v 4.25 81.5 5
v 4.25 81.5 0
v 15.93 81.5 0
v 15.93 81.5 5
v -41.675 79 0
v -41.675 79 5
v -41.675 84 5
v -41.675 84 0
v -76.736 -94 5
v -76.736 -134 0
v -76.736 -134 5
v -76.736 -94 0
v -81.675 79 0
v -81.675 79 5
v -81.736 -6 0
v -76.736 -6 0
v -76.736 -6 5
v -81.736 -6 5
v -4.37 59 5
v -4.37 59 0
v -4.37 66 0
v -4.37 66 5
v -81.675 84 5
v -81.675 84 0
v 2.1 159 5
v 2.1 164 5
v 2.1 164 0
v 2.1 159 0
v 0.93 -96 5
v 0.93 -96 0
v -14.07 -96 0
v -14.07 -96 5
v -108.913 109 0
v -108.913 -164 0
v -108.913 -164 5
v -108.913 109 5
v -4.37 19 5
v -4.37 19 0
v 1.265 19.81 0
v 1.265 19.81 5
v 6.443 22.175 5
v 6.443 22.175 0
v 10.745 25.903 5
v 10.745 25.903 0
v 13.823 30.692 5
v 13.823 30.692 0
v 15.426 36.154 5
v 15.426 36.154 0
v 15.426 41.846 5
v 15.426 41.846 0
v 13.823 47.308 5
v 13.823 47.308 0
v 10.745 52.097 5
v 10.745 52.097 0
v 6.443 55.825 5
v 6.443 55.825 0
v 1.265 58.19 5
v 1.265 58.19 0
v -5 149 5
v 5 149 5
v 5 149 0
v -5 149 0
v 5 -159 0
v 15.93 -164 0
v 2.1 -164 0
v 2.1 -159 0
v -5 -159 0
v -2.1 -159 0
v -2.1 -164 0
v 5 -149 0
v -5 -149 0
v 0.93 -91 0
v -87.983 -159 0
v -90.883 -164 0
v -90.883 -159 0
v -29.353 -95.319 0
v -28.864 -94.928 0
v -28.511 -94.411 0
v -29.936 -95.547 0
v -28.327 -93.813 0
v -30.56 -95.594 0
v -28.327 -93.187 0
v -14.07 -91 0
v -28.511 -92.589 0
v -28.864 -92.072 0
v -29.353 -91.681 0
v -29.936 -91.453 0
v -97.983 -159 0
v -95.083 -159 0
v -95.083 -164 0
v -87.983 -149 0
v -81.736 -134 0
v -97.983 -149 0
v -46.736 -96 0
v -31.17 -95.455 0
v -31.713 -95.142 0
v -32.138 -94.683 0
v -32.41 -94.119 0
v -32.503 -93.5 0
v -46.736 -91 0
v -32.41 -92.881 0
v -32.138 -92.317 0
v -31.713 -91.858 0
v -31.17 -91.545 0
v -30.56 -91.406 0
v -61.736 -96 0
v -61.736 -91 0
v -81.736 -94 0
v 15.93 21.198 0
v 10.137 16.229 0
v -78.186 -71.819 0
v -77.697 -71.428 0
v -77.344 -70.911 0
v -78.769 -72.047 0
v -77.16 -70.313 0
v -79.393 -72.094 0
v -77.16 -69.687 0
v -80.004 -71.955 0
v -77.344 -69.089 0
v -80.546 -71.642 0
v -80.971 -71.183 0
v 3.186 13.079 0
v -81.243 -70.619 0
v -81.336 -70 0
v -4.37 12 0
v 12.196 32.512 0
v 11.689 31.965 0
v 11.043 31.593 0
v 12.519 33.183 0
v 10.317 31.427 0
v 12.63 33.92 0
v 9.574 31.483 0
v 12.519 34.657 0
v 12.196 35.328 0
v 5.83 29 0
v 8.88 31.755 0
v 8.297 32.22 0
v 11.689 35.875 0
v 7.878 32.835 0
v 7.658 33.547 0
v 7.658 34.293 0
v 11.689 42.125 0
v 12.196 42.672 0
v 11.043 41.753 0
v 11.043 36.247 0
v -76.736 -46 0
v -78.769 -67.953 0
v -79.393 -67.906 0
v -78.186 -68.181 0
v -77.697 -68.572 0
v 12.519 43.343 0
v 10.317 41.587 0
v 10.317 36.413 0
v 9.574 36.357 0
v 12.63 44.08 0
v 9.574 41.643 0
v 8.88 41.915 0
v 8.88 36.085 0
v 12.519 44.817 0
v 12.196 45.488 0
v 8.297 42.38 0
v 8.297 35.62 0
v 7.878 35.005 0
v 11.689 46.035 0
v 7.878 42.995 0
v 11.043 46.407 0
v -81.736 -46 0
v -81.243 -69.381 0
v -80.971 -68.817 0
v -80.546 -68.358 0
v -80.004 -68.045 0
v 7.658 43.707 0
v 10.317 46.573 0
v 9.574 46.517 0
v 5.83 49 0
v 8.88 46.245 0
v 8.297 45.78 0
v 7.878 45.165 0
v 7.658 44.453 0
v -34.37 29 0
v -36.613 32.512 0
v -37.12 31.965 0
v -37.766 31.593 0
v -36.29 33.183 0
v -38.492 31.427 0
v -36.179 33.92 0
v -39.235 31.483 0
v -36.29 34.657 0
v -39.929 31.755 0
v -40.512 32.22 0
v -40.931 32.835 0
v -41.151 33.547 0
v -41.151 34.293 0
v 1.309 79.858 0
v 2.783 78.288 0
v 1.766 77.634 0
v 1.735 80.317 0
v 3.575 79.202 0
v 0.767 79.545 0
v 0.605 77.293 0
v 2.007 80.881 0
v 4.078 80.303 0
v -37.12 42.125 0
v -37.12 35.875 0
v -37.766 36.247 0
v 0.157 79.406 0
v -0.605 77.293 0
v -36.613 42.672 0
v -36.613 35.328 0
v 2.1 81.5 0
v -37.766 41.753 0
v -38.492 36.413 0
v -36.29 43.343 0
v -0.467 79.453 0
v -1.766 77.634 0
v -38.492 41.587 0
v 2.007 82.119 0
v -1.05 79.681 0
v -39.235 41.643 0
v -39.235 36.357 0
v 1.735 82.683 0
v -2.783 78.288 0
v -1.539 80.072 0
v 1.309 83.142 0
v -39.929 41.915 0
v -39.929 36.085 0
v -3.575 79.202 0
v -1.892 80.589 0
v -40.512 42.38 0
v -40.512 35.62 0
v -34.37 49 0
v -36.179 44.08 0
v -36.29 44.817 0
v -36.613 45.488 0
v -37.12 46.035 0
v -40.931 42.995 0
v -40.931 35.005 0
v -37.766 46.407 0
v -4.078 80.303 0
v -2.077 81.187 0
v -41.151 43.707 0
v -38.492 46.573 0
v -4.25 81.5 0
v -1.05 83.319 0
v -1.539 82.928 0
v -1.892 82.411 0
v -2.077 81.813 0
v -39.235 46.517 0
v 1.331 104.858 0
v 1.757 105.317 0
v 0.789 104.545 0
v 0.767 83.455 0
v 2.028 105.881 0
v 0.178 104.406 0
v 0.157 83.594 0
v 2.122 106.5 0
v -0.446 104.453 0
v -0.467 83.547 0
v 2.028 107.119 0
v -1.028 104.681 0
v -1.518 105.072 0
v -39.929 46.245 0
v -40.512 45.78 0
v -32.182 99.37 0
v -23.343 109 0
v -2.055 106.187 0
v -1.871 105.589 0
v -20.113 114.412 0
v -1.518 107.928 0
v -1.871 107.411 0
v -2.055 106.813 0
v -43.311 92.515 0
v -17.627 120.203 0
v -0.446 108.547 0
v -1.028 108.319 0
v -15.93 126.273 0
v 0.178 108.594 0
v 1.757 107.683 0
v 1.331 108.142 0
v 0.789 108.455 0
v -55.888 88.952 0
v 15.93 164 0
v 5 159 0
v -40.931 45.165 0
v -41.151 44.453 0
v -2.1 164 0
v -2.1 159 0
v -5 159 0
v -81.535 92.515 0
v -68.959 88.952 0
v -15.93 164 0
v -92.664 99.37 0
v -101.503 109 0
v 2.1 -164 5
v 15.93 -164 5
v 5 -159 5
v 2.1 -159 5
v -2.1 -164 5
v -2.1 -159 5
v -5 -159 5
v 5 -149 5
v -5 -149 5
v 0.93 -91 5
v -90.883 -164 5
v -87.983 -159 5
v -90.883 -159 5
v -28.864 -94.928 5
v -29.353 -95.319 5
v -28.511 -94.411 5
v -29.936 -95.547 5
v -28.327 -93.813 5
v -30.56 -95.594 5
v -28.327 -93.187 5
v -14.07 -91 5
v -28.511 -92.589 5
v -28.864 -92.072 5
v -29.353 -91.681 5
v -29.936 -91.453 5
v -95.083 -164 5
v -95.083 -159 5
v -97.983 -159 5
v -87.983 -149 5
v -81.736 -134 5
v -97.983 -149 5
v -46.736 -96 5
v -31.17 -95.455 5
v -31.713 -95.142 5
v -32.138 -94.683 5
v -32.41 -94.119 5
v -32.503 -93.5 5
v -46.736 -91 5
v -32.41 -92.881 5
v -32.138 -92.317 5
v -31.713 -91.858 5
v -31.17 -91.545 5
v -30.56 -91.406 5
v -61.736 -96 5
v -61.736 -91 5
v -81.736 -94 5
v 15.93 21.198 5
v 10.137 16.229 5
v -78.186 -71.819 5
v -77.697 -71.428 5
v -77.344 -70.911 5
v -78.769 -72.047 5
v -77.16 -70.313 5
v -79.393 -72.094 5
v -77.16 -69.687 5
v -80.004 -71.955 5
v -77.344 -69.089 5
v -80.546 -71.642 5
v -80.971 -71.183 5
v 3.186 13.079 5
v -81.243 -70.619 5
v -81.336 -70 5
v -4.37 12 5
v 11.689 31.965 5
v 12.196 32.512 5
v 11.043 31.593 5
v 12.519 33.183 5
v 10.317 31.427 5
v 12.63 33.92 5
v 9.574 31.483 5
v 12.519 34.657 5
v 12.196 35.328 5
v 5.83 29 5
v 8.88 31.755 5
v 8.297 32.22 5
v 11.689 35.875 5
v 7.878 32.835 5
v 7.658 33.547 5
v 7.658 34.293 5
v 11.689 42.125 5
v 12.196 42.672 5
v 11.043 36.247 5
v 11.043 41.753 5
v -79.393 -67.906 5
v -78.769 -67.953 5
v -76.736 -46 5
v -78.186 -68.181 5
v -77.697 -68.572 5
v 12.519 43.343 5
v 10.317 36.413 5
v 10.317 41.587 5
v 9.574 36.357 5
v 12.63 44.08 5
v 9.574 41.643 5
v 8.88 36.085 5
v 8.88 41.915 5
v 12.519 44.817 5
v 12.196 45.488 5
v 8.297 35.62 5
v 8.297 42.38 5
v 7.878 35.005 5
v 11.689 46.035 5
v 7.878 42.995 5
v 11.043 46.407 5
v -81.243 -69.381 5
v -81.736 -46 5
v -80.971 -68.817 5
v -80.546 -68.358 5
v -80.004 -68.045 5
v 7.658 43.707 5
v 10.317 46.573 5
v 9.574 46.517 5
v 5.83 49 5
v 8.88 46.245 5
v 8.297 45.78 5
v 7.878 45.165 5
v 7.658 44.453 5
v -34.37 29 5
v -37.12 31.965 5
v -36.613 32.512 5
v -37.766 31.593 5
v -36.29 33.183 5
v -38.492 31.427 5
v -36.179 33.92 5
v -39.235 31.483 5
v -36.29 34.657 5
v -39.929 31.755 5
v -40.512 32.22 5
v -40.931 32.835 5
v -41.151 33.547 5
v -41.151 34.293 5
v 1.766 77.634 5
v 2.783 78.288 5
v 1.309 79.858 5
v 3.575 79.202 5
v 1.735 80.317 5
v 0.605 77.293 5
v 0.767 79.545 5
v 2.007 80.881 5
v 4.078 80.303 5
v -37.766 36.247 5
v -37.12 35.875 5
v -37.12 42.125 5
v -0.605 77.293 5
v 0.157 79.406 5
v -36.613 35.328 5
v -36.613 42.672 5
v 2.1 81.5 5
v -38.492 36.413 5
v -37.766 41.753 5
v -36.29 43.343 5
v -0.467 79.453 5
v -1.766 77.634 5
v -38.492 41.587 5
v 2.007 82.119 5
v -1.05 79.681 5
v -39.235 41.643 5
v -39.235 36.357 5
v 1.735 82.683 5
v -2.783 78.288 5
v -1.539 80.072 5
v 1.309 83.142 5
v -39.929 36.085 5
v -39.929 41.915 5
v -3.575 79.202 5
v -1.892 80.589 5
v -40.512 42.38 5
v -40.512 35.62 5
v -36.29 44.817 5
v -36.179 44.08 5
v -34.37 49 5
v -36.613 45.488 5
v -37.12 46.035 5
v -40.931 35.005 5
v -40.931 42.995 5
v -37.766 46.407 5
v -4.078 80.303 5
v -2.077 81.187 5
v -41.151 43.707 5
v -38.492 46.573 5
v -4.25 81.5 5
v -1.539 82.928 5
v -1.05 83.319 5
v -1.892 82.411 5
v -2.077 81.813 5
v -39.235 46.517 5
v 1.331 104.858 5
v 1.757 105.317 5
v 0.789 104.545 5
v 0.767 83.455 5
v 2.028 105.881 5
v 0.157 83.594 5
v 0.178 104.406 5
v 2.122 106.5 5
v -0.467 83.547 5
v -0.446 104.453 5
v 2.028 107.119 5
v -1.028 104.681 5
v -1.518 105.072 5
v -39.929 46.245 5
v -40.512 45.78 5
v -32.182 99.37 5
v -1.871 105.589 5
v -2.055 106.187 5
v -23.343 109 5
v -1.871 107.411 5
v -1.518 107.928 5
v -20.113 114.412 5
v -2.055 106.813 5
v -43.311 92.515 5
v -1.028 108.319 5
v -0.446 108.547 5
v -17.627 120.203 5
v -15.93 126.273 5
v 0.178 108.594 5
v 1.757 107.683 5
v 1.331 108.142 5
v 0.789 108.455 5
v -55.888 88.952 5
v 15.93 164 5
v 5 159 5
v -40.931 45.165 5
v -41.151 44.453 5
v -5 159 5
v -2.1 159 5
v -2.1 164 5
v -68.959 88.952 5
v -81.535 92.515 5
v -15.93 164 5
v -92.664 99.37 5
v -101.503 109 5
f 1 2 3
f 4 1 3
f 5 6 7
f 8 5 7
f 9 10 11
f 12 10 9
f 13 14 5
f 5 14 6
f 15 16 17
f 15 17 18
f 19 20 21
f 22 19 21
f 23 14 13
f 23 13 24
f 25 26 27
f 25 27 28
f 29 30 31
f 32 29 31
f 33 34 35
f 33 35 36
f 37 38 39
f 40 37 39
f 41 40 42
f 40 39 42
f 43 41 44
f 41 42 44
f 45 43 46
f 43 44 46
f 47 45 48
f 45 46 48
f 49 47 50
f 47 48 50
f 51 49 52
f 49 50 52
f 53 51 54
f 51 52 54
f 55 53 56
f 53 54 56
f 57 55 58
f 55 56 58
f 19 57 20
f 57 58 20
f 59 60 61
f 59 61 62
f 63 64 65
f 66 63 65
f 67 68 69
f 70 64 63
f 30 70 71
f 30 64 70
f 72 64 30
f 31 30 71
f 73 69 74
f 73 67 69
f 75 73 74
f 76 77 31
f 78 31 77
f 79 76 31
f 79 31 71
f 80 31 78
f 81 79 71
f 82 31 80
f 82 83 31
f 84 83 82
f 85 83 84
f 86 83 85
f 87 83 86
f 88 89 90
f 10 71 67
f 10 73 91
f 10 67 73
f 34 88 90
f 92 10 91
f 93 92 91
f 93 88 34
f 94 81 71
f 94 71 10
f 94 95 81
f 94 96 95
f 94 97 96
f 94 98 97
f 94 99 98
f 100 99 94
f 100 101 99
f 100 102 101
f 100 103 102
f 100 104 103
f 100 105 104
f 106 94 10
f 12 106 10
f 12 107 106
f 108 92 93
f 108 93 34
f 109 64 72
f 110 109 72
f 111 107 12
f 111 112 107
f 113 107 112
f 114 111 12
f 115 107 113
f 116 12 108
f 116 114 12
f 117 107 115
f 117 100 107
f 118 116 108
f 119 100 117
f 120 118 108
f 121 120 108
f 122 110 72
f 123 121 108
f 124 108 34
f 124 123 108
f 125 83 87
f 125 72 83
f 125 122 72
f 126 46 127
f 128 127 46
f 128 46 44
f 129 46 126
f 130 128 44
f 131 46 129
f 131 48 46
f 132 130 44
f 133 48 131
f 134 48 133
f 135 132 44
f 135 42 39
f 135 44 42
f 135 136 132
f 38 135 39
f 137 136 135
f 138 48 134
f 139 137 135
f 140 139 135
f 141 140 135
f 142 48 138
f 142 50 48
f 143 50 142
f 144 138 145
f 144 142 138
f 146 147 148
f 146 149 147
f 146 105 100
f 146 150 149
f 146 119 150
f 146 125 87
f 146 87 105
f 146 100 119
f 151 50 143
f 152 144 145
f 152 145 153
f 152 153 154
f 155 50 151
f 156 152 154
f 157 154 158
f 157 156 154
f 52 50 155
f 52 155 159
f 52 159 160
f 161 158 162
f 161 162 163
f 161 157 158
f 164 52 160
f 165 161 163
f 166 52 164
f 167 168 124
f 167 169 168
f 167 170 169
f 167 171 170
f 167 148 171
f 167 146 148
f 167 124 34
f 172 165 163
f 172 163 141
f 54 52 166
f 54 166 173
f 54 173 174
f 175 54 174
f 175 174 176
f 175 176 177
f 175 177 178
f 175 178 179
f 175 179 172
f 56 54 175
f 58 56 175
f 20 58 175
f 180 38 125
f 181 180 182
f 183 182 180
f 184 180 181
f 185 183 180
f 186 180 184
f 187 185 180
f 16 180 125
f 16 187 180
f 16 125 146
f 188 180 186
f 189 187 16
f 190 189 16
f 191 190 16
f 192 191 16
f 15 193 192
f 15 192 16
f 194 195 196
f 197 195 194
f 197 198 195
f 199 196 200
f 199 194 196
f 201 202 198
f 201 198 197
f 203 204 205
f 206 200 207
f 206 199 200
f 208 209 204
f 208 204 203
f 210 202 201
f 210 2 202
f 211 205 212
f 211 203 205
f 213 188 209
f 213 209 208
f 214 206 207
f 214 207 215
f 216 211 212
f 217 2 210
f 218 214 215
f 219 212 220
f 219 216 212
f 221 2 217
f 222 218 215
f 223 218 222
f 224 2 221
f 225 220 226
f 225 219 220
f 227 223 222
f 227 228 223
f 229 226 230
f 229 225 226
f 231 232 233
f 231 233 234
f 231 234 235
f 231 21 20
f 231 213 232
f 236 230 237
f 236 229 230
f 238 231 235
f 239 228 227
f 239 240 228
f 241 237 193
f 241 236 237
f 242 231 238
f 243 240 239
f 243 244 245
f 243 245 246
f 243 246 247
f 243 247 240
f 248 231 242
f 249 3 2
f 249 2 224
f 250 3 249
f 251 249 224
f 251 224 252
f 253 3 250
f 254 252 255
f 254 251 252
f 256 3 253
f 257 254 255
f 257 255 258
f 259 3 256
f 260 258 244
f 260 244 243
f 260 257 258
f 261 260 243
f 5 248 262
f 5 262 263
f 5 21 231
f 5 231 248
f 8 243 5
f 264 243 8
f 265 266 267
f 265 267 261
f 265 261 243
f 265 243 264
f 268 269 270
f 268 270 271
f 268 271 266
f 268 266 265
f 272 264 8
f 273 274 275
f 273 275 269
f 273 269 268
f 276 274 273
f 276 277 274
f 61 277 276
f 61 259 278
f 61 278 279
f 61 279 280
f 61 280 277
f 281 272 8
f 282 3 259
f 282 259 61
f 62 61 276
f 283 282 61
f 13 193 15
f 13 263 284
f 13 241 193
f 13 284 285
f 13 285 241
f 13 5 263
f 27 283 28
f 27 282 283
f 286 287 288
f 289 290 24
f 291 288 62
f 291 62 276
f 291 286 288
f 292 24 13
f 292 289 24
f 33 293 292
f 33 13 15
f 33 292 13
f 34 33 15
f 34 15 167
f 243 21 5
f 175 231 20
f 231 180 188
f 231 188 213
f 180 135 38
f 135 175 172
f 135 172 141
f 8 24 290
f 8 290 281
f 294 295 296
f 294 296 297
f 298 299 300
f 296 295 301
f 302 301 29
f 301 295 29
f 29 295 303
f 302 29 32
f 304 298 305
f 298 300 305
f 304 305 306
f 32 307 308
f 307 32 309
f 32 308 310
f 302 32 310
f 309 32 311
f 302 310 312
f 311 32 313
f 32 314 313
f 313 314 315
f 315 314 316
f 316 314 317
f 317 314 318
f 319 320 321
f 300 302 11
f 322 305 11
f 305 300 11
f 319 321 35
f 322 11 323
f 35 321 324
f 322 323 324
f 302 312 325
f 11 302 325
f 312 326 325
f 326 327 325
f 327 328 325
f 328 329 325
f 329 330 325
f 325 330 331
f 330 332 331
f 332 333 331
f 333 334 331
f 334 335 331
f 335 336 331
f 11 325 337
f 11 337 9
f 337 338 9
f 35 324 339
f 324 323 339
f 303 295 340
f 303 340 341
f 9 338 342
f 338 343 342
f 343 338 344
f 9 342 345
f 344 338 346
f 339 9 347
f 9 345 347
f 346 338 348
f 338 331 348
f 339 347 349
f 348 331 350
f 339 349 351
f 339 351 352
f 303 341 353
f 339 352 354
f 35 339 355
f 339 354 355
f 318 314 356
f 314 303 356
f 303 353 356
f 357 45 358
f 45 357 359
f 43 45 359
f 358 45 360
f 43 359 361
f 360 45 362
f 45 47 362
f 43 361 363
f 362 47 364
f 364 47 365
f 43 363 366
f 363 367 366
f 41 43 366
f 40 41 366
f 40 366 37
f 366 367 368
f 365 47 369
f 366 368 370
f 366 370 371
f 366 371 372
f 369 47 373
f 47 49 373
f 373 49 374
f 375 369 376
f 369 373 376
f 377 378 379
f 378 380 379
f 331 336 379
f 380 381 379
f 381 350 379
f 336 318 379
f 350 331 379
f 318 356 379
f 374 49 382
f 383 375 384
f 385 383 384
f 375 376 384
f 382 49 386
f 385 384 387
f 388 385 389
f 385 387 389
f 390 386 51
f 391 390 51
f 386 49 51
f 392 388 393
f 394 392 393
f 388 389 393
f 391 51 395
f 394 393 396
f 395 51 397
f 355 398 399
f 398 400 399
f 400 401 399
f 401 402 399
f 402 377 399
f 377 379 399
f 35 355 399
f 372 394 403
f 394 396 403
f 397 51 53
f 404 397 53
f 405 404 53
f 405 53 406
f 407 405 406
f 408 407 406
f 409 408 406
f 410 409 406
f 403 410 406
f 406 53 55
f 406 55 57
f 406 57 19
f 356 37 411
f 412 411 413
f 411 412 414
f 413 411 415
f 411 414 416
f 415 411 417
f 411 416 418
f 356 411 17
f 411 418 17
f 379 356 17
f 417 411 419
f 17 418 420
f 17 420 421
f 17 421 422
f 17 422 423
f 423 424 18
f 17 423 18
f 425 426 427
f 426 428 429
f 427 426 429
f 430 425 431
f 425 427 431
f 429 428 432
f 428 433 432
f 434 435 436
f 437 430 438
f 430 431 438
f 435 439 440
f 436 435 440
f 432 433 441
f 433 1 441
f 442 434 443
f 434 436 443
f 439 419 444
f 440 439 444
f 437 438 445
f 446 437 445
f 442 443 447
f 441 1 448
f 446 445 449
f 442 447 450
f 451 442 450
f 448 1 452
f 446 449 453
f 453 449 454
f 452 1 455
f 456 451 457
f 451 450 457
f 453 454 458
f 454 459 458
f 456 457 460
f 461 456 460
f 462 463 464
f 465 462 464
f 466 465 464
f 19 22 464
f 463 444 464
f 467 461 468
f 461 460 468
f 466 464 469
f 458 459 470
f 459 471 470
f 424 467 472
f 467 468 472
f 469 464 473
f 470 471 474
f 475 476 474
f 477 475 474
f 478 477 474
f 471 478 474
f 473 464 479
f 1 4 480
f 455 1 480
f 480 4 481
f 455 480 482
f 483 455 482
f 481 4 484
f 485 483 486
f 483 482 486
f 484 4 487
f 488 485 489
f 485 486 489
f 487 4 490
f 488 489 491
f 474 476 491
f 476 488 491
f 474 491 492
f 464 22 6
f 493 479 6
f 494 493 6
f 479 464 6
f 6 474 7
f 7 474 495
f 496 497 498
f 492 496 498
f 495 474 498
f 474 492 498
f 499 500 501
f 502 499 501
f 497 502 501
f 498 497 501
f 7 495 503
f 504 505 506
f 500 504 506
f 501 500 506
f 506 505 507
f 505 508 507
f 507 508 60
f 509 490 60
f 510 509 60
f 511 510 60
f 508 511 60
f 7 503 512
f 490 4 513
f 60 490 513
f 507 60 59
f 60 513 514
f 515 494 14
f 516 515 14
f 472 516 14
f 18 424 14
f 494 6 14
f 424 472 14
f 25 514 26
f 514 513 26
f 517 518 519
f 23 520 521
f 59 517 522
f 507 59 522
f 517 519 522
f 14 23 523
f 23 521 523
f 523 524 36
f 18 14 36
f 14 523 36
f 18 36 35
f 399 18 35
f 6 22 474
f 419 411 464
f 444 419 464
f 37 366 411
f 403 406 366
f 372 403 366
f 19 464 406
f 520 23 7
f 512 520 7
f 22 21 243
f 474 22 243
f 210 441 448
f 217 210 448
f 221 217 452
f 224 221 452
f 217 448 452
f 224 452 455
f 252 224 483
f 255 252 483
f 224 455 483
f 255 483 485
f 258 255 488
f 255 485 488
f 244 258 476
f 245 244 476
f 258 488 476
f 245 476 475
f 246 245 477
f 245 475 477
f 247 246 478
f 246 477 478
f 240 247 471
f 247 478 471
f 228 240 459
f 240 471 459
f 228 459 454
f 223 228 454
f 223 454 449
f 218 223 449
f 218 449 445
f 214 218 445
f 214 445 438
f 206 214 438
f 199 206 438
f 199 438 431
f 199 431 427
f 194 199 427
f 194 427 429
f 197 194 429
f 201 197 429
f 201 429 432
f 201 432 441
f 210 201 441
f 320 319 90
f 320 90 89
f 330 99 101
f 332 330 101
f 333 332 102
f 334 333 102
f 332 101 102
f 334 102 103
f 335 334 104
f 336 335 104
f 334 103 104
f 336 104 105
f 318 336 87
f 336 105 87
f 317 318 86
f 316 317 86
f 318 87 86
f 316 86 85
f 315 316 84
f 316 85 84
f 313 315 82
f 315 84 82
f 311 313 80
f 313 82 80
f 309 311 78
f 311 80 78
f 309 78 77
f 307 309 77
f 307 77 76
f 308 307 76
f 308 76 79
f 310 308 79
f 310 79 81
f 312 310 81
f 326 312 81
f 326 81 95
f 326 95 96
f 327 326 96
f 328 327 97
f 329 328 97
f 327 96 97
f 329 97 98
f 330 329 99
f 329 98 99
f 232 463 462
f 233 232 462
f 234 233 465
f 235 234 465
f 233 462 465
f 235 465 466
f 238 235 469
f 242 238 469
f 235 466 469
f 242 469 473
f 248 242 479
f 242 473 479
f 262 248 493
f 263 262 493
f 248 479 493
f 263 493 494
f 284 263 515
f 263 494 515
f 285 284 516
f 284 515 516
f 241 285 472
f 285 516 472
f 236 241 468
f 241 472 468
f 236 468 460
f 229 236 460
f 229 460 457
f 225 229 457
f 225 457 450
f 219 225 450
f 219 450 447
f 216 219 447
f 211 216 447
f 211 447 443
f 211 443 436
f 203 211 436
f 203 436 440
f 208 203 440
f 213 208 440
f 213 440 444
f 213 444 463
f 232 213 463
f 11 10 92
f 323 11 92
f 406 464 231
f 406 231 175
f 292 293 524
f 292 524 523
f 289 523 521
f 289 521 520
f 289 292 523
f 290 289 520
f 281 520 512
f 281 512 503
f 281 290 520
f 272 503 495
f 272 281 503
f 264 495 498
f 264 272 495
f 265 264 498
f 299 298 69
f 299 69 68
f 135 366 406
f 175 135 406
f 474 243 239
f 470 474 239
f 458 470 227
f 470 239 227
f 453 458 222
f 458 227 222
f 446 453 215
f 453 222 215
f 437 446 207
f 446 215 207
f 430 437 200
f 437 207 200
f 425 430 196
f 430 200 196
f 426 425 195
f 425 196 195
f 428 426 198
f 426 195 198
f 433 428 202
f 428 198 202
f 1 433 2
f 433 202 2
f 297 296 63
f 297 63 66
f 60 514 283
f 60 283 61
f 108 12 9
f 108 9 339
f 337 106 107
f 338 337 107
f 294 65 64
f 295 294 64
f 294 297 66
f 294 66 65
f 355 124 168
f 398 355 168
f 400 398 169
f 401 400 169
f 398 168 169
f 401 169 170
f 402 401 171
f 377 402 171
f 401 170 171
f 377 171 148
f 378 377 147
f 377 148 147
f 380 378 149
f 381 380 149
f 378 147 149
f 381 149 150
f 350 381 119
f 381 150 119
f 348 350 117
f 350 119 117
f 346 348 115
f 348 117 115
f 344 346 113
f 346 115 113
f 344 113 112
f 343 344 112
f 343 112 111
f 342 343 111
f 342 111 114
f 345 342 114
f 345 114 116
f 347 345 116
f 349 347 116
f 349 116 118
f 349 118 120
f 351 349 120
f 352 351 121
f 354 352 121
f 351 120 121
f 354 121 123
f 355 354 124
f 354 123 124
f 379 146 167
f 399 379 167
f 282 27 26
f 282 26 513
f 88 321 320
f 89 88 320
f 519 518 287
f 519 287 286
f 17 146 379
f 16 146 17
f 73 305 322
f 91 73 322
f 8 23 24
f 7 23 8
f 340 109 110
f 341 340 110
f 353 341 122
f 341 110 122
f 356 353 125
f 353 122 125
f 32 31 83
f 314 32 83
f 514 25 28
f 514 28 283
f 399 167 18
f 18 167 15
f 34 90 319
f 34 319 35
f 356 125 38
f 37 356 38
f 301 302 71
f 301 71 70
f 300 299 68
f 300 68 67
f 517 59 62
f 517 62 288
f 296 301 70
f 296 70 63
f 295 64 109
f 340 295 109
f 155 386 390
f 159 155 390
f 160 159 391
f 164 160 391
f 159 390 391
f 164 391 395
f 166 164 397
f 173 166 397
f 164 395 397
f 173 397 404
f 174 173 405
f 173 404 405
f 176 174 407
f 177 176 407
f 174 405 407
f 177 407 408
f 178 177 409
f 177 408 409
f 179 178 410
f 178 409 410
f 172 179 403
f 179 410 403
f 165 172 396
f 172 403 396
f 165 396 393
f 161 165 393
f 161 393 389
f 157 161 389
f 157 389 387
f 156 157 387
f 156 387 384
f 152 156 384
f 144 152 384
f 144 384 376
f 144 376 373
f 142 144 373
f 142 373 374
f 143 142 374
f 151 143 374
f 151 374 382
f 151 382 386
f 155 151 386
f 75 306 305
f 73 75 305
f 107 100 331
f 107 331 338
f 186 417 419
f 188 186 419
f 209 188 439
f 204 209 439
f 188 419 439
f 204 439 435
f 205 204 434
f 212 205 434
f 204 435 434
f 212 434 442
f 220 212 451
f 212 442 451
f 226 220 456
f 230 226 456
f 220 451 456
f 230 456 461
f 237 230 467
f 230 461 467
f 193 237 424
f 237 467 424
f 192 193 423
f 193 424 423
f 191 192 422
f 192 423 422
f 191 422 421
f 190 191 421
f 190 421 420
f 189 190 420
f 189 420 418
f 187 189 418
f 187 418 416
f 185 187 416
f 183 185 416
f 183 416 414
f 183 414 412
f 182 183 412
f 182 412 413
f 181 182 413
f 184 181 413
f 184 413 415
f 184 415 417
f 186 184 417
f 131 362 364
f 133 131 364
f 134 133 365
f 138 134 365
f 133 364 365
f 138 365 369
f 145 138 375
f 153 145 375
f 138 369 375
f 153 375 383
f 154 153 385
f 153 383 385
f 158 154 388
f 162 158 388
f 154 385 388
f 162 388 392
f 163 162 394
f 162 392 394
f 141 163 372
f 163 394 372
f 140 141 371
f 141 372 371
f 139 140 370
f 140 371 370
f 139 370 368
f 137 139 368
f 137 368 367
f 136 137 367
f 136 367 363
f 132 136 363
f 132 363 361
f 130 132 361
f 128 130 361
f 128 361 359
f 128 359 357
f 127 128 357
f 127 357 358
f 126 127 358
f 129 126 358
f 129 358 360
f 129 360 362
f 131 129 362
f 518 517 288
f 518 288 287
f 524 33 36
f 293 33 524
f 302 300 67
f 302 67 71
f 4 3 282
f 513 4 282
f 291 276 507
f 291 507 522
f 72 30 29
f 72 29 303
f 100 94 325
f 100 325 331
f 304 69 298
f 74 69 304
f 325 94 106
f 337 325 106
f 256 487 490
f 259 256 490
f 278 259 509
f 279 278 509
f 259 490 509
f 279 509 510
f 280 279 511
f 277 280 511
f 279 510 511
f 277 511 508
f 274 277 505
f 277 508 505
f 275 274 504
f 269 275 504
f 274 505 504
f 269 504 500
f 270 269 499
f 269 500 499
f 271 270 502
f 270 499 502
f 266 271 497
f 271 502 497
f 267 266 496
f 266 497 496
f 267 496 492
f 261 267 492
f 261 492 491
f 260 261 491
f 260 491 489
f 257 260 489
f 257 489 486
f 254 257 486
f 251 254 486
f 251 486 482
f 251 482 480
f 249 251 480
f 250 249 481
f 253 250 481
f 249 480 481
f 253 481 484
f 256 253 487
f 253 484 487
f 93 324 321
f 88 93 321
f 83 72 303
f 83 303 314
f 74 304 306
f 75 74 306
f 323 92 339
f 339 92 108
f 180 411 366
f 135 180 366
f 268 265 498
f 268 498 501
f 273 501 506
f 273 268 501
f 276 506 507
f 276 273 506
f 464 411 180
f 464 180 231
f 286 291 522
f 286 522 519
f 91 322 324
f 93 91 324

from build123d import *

# Parameters (mm, degrees)
SKETCH1_W           = 31.86
SKETCH1_H           = 328
BOSS_EXTRUDE1_DEPTH = 5
SKETCH2_R           = 2.1
CUT_EXTRUDE1_DEPTH  = 10
CUT_EXTRUDE2_DEPTH  = 10
BOSS_EXTRUDE2_DEPTH = 5
SKETCH7_W           = 4.2
SKETCH7_H           = 5
SKETCH7_R           = 2.099999245
CUT_EXTRUDE3_DEPTH  = 5
SKETCH8_R           = 2.499996422
SKETCH8_R_2         = 2.499996502
SKETCH8_R_3         = 2.5
SKETCH8_W           = 40.200355047
SKETCH8_H           = 20
CUT_EXTRUDE4_DEPTH  = 10
CUT_EXTRUDE5_DEPTH  = 10
CUT_EXTRUDE6_DEPTH  = 10
SKETCH12_R          = 2.100000755
SKETCH12_R_2        = 2.1
SKETCH12_W          = 15.000005391
SKETCH12_H          = 5
SKETCH12_W_2        = 5
SKETCH12_H_2        = 40
CUT_EXTRUDE7_DEPTH  = 5
SKETCH15_W          = 40
SKETCH15_H          = 5
CUT_EXTRUDE8_DEPTH  = 5


with BuildPart() as part:
    # Sketch1 → Boss-Extrude1 (new body)
    with BuildSketch(Plane.XY):
        Rectangle(SKETCH1_W, SKETCH1_H)
    extrude(amount=BOSS_EXTRUDE1_DEPTH)

    # Sketch2 → Cut-Extrude1 (cut)
    with BuildSketch(Plane.XY.offset(5)):
        with Locations((0, 81.5)):
            Circle(SKETCH2_R)
    extrude(amount=-CUT_EXTRUDE1_DEPTH, mode=Mode.SUBTRACT)

    # Sketch3 → Cut-Extrude2 (cut)
    with BuildSketch(Plane.XY.offset(5)):
        Polygon((2.1, 164), (2.1, 159), (5, 159), (5, 149), (-5, 149), (-5, 159), (-2.1, 159), (-2.1, 164), align=None)
        Polygon((-2.1, -164), (-2.1, -159), (-5, -159), (-5, -149), (5, -149), (5, -159), (2.1, -159), (2.1, -164), align=None)
    extrude(amount=-CUT_EXTRUDE2_DEPTH, mode=Mode.SUBTRACT)

    # Sketch4 → Boss-Extrude2 (add)
    with BuildSketch(Plane(origin=(0, 0, 0), x_dir=(-1, 0, 0), z_dir=(0, 0, -1))):
        with BuildLine():
            Line((15.93, -164), (108.913444487, -164))
            Line((108.913444487, -164), (108.913444487, 109))
            Line((108.913444487, 109), (101.503490547, 109))
            ThreePointArc((101.503490547, 109), (62.423444487, 88.5), (23.343398428, 109))
            ThreePointArc((23.343398428, 109), (18.773737927, 117.266257257), (15.93, 126.273252357))
            Line((15.93, 126.273252357), (15.93, 109))
            Line((15.93, 109), (15.93, -164))
        make_face()
    extrude(amount=-BOSS_EXTRUDE2_DEPTH)

    # Sketch7 → Cut-Extrude3 (cut)
    with BuildSketch(Plane.XY.offset(5)):
        Polygon((-95.083444487, -159), (-90.883444487, -159), (-87.983444487, -159), (-87.983444487, -149), (-97.983444487, -149), (-97.983444487, -159), align=None)
        with Locations((-92.983444487, -161.5)):
            Rectangle(SKETCH7_W, SKETCH7_H)
        with Locations((0.021526005, 106.5)):
            Circle(SKETCH7_R)
    extrude(amount=-CUT_EXTRUDE3_DEPTH, mode=Mode.SUBTRACT)

    # Sketch8 → Cut-Extrude4 (cut)
    with BuildSketch(Plane.XY.offset(5)):
        with Locations((-38.679067758, 44.08)):
            Circle(SKETCH8_R)
        with Locations((-38.679067758, 33.92)):
            Circle(SKETCH8_R_2)
        with Locations((10.13, 44.08)):
            Circle(SKETCH8_R_3)
        with Locations((10.13, 33.92)):
            Circle(SKETCH8_R_3)
        with Locations((-14.269822477, 39)):
            Rectangle(SKETCH8_W, SKETCH8_H)
    extrude(amount=-CUT_EXTRUDE4_DEPTH, mode=Mode.SUBTRACT)

    # Sketch9 → Cut-Extrude5 (cut)
    with BuildSketch(Plane(origin=(0, 0, 0), x_dir=(-1, 0, 0), z_dir=(0, 0, -1))):
        with BuildLine():
            Line((4.37, 12), (4.37, 19))
            ThreePointArc((4.37, 19), (-15.63, 39), (4.37, 59))
            Line((4.37, 59), (4.37, 66))
            ThreePointArc((4.37, 66), (-22.63, 39), (4.37, 12))
        make_face()
    extrude(amount=-CUT_EXTRUDE5_DEPTH, mode=Mode.SUBTRACT)

    # Sketch10 → Cut-Extrude6 (cut)
    with BuildSketch(Plane(origin=(0, 0, 0), x_dir=(-1, 0, 0), z_dir=(0, 0, -1))):
        with BuildLine():
            Line((-15.93, 66), (-15.93, 56.801966184))
            ThreePointArc((-15.93, 56.801966184), (-6.773314432, 63.593221495), (4.37, 66))
            Line((4.37, 66), (4.25, 81.5))
            ThreePointArc((4.25, 81.5), (0, 77.25), (-4.25, 81.5))
            Line((-4.25, 81.5), (-15.93, 81.5))
            Line((-15.93, 81.5), (-15.93, 66))
        make_face()
    extrude(amount=-CUT_EXTRUDE6_DEPTH, mode=Mode.SUBTRACT)

    # Sketch12 → Cut-Extrude7 (cut)
    with BuildSketch(Plane(origin=(0, 0, 0), x_dir=(-1, 0, 0), z_dir=(0, 0, -1))):
        with Locations((30.403186809, -93.5)):
            Circle(SKETCH12_R)
        with Locations((79.236368236, -70)):
            Circle(SKETCH12_R_2)
        with Locations((54.236365541, -93.5)):
            Rectangle(SKETCH12_W, SKETCH12_H)
        with Locations((6.570008077, -93.5)):
            Rectangle(SKETCH12_W, SKETCH12_H)
        with Locations((79.236368236, -114)):
            Rectangle(SKETCH12_W_2, SKETCH12_H_2)
        with Locations((79.236368236, -26)):
            Rectangle(SKETCH12_W_2, SKETCH12_H_2)
    extrude(amount=-CUT_EXTRUDE7_DEPTH, mode=Mode.SUBTRACT)

    # Sketch15 → Cut-Extrude8 (cut)
    with BuildSketch(Plane.XY.offset(5)):
        with Locations((-61.674975637, 81.5)):
            Rectangle(SKETCH15_W, SKETCH15_H)
    extrude(amount=-CUT_EXTRUDE8_DEPTH, mode=Mode.SUBTRACT)


solid = part.part
